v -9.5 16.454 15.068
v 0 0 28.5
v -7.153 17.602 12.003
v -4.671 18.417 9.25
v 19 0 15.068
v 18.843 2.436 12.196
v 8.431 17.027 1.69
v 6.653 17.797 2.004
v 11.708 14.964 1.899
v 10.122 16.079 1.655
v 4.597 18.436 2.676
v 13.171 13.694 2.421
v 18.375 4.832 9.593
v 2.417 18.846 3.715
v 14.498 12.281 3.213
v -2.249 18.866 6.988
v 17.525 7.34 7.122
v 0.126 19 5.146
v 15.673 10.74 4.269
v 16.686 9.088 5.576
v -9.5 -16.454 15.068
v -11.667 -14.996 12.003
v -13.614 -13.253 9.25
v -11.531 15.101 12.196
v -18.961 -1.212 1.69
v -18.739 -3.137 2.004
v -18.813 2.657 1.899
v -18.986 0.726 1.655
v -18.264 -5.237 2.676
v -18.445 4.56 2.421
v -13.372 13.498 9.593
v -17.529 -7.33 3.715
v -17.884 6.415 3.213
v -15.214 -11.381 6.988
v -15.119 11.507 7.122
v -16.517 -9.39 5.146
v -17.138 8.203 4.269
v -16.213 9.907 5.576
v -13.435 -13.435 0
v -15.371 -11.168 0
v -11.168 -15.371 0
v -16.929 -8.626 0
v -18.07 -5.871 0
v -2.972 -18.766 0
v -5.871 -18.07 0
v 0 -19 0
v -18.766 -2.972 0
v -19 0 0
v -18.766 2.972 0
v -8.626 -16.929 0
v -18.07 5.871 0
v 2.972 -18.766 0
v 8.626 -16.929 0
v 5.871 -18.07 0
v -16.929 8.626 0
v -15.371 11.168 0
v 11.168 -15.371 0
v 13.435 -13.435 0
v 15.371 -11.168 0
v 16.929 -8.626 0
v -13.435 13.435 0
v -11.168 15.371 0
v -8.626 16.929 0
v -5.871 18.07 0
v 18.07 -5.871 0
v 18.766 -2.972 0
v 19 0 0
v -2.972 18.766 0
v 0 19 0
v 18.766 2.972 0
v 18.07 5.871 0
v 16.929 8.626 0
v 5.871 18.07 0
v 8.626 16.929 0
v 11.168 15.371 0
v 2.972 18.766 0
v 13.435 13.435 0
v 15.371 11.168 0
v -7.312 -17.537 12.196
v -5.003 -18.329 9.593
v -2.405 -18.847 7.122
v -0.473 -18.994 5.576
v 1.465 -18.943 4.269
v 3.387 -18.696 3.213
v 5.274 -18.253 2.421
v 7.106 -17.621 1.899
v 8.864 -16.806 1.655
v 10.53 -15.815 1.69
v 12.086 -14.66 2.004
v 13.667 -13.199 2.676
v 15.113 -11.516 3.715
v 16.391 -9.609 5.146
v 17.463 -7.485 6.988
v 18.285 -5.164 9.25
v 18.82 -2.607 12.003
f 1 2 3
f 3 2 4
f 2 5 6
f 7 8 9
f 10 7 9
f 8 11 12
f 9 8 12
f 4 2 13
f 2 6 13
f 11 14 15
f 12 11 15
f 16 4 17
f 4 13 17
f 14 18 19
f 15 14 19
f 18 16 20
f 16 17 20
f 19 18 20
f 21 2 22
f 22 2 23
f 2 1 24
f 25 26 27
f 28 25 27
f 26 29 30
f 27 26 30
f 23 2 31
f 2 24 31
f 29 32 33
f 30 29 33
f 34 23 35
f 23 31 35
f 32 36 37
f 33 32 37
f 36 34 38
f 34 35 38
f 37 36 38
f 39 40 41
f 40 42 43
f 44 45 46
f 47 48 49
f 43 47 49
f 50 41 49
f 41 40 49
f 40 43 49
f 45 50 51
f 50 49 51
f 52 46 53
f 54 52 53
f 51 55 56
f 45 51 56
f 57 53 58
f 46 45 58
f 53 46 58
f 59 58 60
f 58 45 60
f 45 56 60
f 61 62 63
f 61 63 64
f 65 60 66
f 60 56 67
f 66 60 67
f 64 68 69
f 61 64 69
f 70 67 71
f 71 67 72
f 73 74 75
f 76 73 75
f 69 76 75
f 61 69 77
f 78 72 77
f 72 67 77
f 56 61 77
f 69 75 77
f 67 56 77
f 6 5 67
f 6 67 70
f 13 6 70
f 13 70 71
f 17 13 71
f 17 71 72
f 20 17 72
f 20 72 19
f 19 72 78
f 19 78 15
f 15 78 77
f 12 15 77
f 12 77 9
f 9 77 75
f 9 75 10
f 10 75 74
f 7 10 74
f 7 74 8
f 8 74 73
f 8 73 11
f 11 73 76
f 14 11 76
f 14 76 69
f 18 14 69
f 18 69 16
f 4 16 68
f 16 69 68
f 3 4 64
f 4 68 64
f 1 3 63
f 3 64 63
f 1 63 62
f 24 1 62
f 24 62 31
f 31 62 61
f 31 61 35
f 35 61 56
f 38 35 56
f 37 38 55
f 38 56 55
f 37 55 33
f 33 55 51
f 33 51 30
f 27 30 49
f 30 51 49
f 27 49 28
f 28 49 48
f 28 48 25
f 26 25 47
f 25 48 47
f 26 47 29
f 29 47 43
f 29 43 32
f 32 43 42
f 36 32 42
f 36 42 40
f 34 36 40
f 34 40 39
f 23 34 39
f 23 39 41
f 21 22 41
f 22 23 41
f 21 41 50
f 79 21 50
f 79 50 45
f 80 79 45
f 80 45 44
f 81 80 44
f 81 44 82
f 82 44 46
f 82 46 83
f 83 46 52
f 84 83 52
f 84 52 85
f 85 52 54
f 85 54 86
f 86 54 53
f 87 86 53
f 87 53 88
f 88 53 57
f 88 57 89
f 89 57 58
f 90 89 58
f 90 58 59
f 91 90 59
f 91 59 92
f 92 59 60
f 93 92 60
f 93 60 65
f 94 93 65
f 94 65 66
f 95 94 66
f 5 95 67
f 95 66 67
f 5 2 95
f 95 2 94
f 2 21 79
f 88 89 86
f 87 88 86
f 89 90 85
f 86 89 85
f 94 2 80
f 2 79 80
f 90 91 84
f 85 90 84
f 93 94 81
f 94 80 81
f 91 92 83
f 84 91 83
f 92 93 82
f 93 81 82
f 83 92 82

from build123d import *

# Parameters (mm, degrees)
SKETCH_1_R          = 19
EXTRUDE_1_DEPTH     = 28.5
CUT_EXTRUDE_1_DEPTH = 24.5
CUT_EXTRUDE_2_DEPTH = 37
CUT_EXTRUDE_3_DEPTH = 28.5


with BuildPart() as part:
    # 草图1 → 凸台-拉伸1 (new body)
    with BuildSketch(Plane.XY):
        Circle(SKETCH_1_R)
    extrude(amount=EXTRUDE_1_DEPTH)

    # 草图2 → 切除-拉伸1 (cut, symmetric)
    with BuildSketch(Plane(origin=(0, 0, 0), x_dir=(1, 0, 0), z_dir=(0, 1, 0))):
        Polygon((0, -28.5), (-22.967769977, 3.974585824), (-22.967769977, -37.518896878), (0, -37.518896878), align=None)
    extrude(amount=CUT_EXTRUDE_1_DEPTH, both=True, mode=Mode.SUBTRACT)

    # 草图4 → 切除-拉伸2 (cut, symmetric)
    with BuildSketch(Plane(origin=(0, 0, 0), x_dir=(0.5, 0.866025404, 0), z_dir=(0.866025404, -0.5, 0))):
        Polygon((0, 28.5), (68.254426356, -68.006288105), (68.254426356, 39.794321241), (0, 39.794321241), align=None)
    extrude(amount=CUT_EXTRUDE_2_DEPTH, both=True, mode=Mode.SUBTRACT)

    # 草图5 → 切除-拉伸3 (cut, symmetric)
    with BuildSketch(Plane(origin=(0, 0, 0), x_dir=(0.5, -0.866025404, 0), z_dir=(-0.866025404, -0.5, 0))):
        Polygon((0, 28.5), (25.869335206, -8.07716649), (25.869335206, 34.9969783), (-0.936236718, 34.9969783), align=None)
    extrude(amount=CUT_EXTRUDE_3_DEPTH, both=True, mode=Mode.SUBTRACT)


solid = part.part
